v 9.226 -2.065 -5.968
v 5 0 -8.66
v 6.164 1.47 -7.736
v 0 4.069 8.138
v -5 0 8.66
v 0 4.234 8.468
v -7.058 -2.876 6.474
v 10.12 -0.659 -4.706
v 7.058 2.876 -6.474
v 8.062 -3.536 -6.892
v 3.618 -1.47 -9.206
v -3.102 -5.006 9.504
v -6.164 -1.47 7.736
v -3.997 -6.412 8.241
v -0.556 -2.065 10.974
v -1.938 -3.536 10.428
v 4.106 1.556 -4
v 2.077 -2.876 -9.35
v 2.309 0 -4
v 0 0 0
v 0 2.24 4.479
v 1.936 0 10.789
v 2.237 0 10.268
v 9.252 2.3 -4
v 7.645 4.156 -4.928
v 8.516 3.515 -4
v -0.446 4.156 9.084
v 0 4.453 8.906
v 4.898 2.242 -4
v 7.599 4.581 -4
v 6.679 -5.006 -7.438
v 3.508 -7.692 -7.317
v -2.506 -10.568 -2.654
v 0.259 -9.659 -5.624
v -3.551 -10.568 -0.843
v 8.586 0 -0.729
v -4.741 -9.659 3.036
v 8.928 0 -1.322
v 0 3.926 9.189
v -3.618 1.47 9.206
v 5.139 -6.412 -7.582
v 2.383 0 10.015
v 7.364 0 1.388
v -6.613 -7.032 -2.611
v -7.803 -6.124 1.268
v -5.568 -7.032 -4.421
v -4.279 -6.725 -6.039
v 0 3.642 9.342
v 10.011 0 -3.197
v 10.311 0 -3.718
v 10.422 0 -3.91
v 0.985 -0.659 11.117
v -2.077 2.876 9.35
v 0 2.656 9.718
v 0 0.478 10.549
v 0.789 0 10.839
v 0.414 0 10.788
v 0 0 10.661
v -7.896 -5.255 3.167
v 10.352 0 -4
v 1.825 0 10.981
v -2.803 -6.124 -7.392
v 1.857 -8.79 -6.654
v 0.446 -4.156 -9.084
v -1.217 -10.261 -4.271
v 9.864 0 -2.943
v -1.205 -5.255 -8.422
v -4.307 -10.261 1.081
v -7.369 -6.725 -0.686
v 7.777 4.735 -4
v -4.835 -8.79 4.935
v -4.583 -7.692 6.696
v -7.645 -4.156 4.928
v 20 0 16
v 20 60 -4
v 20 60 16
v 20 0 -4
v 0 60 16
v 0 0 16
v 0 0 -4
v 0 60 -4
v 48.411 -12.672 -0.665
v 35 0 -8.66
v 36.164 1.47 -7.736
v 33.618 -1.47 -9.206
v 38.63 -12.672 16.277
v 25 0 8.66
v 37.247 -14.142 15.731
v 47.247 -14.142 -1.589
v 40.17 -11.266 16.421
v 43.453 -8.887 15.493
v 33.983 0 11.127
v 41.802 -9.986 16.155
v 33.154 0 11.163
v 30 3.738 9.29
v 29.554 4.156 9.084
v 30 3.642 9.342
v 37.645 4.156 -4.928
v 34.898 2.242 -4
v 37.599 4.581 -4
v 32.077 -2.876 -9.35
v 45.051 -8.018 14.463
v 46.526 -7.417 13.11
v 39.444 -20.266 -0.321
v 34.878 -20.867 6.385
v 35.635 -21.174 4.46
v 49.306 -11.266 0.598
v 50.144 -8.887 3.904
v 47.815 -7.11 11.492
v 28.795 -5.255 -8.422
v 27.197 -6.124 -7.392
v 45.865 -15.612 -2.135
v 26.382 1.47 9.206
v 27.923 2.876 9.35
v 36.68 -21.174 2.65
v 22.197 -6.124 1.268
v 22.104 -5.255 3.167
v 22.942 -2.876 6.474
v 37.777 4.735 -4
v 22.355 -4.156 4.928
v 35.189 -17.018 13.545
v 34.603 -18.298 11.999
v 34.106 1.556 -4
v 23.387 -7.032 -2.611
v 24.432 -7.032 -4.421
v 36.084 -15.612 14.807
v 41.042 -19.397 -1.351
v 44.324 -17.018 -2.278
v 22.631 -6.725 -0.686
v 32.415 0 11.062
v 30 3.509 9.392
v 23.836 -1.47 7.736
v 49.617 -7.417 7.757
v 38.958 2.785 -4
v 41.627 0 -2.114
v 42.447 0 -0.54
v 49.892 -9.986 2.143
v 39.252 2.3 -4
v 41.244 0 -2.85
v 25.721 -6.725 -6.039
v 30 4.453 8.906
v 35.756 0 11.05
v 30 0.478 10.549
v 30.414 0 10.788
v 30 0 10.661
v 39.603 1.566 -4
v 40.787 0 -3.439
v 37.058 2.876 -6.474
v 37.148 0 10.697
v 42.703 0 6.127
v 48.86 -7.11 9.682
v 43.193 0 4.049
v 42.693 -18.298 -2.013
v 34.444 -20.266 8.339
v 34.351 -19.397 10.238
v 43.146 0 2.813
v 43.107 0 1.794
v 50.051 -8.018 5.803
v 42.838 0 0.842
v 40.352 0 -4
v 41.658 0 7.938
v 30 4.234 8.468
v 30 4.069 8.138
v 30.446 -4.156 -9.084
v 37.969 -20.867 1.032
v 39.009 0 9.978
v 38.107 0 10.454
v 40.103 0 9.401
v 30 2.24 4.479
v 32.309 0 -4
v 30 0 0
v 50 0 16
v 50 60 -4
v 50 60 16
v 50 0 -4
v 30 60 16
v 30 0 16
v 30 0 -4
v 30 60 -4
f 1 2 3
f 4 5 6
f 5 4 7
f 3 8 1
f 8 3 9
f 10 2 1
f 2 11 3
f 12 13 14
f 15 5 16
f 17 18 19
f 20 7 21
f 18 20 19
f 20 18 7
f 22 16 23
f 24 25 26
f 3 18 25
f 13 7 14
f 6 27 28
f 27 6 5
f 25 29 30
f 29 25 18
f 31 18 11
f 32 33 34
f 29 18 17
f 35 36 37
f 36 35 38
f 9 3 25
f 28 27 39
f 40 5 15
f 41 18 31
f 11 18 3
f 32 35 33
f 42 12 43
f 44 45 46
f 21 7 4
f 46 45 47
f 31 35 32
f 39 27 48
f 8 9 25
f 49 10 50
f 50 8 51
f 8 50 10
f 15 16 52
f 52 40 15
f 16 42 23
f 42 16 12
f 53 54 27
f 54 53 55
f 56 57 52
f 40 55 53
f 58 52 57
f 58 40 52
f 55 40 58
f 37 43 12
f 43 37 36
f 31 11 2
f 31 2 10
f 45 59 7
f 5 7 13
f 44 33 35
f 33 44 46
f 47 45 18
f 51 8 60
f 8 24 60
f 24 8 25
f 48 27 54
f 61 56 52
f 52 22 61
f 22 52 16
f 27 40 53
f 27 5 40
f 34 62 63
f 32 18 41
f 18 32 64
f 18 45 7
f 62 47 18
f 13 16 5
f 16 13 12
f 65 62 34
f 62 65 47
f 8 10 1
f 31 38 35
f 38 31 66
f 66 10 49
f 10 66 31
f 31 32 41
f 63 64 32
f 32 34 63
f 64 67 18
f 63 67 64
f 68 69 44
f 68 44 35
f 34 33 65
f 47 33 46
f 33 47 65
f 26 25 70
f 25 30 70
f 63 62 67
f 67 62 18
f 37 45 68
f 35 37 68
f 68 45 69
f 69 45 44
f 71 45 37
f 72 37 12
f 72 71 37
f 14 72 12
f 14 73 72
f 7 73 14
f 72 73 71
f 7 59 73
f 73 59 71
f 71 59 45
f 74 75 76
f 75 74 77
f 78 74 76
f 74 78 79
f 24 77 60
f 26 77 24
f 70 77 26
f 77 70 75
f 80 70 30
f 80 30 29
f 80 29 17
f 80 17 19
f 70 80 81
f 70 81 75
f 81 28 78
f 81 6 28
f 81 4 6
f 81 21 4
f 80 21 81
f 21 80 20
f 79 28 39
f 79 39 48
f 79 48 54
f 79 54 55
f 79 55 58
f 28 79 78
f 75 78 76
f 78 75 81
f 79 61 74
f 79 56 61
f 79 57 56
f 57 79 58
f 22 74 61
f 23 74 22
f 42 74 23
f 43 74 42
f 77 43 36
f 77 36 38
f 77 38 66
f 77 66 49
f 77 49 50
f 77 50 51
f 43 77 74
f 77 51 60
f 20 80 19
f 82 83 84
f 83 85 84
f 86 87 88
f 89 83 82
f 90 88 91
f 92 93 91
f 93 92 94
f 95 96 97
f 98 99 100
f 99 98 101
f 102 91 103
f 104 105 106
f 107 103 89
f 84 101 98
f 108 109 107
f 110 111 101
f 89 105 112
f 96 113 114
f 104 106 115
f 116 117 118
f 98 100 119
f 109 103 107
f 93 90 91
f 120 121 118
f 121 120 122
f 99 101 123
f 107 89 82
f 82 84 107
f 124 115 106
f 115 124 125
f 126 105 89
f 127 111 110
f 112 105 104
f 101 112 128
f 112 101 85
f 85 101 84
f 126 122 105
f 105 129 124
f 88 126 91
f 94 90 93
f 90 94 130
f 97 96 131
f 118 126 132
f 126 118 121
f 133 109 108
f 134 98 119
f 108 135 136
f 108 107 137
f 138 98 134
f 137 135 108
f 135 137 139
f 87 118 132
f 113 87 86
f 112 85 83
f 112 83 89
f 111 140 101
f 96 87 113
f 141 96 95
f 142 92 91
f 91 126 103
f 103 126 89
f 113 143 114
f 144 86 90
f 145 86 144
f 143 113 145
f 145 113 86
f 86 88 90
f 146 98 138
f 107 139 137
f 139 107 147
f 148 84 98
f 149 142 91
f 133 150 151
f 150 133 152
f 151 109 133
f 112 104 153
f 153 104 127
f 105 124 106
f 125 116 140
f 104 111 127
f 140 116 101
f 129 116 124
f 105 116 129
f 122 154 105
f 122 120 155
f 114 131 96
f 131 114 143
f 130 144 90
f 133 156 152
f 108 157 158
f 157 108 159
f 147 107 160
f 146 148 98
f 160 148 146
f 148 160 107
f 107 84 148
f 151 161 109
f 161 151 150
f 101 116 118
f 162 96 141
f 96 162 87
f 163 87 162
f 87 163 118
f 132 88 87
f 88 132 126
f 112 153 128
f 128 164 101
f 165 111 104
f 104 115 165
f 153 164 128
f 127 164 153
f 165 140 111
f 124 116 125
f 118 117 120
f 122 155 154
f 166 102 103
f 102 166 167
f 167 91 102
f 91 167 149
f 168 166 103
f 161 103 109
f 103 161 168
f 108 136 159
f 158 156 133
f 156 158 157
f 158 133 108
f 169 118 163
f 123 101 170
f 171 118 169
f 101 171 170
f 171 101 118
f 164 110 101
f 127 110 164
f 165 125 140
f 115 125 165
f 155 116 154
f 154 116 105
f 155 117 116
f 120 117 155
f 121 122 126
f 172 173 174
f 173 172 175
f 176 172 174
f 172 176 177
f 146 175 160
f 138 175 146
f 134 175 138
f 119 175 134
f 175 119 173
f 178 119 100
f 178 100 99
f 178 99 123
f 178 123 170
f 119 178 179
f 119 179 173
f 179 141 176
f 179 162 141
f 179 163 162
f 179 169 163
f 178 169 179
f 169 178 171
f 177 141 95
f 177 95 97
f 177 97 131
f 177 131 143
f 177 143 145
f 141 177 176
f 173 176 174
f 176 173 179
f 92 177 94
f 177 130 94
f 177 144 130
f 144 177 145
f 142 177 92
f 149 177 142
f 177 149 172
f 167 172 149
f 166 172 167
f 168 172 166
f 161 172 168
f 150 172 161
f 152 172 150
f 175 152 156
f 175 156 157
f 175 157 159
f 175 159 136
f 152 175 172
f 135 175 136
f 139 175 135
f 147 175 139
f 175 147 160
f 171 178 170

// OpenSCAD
b = 23;
module banana( b )
{
 union()
 {
  rotate( [45,60,0] ) cylinder(h=b, r=10);
  translate( [0,0,-4] ) scale([1,3,1]) cube(20);
 }
}

banana(b=5);

translate([30,0,0]) banana(b=20);
